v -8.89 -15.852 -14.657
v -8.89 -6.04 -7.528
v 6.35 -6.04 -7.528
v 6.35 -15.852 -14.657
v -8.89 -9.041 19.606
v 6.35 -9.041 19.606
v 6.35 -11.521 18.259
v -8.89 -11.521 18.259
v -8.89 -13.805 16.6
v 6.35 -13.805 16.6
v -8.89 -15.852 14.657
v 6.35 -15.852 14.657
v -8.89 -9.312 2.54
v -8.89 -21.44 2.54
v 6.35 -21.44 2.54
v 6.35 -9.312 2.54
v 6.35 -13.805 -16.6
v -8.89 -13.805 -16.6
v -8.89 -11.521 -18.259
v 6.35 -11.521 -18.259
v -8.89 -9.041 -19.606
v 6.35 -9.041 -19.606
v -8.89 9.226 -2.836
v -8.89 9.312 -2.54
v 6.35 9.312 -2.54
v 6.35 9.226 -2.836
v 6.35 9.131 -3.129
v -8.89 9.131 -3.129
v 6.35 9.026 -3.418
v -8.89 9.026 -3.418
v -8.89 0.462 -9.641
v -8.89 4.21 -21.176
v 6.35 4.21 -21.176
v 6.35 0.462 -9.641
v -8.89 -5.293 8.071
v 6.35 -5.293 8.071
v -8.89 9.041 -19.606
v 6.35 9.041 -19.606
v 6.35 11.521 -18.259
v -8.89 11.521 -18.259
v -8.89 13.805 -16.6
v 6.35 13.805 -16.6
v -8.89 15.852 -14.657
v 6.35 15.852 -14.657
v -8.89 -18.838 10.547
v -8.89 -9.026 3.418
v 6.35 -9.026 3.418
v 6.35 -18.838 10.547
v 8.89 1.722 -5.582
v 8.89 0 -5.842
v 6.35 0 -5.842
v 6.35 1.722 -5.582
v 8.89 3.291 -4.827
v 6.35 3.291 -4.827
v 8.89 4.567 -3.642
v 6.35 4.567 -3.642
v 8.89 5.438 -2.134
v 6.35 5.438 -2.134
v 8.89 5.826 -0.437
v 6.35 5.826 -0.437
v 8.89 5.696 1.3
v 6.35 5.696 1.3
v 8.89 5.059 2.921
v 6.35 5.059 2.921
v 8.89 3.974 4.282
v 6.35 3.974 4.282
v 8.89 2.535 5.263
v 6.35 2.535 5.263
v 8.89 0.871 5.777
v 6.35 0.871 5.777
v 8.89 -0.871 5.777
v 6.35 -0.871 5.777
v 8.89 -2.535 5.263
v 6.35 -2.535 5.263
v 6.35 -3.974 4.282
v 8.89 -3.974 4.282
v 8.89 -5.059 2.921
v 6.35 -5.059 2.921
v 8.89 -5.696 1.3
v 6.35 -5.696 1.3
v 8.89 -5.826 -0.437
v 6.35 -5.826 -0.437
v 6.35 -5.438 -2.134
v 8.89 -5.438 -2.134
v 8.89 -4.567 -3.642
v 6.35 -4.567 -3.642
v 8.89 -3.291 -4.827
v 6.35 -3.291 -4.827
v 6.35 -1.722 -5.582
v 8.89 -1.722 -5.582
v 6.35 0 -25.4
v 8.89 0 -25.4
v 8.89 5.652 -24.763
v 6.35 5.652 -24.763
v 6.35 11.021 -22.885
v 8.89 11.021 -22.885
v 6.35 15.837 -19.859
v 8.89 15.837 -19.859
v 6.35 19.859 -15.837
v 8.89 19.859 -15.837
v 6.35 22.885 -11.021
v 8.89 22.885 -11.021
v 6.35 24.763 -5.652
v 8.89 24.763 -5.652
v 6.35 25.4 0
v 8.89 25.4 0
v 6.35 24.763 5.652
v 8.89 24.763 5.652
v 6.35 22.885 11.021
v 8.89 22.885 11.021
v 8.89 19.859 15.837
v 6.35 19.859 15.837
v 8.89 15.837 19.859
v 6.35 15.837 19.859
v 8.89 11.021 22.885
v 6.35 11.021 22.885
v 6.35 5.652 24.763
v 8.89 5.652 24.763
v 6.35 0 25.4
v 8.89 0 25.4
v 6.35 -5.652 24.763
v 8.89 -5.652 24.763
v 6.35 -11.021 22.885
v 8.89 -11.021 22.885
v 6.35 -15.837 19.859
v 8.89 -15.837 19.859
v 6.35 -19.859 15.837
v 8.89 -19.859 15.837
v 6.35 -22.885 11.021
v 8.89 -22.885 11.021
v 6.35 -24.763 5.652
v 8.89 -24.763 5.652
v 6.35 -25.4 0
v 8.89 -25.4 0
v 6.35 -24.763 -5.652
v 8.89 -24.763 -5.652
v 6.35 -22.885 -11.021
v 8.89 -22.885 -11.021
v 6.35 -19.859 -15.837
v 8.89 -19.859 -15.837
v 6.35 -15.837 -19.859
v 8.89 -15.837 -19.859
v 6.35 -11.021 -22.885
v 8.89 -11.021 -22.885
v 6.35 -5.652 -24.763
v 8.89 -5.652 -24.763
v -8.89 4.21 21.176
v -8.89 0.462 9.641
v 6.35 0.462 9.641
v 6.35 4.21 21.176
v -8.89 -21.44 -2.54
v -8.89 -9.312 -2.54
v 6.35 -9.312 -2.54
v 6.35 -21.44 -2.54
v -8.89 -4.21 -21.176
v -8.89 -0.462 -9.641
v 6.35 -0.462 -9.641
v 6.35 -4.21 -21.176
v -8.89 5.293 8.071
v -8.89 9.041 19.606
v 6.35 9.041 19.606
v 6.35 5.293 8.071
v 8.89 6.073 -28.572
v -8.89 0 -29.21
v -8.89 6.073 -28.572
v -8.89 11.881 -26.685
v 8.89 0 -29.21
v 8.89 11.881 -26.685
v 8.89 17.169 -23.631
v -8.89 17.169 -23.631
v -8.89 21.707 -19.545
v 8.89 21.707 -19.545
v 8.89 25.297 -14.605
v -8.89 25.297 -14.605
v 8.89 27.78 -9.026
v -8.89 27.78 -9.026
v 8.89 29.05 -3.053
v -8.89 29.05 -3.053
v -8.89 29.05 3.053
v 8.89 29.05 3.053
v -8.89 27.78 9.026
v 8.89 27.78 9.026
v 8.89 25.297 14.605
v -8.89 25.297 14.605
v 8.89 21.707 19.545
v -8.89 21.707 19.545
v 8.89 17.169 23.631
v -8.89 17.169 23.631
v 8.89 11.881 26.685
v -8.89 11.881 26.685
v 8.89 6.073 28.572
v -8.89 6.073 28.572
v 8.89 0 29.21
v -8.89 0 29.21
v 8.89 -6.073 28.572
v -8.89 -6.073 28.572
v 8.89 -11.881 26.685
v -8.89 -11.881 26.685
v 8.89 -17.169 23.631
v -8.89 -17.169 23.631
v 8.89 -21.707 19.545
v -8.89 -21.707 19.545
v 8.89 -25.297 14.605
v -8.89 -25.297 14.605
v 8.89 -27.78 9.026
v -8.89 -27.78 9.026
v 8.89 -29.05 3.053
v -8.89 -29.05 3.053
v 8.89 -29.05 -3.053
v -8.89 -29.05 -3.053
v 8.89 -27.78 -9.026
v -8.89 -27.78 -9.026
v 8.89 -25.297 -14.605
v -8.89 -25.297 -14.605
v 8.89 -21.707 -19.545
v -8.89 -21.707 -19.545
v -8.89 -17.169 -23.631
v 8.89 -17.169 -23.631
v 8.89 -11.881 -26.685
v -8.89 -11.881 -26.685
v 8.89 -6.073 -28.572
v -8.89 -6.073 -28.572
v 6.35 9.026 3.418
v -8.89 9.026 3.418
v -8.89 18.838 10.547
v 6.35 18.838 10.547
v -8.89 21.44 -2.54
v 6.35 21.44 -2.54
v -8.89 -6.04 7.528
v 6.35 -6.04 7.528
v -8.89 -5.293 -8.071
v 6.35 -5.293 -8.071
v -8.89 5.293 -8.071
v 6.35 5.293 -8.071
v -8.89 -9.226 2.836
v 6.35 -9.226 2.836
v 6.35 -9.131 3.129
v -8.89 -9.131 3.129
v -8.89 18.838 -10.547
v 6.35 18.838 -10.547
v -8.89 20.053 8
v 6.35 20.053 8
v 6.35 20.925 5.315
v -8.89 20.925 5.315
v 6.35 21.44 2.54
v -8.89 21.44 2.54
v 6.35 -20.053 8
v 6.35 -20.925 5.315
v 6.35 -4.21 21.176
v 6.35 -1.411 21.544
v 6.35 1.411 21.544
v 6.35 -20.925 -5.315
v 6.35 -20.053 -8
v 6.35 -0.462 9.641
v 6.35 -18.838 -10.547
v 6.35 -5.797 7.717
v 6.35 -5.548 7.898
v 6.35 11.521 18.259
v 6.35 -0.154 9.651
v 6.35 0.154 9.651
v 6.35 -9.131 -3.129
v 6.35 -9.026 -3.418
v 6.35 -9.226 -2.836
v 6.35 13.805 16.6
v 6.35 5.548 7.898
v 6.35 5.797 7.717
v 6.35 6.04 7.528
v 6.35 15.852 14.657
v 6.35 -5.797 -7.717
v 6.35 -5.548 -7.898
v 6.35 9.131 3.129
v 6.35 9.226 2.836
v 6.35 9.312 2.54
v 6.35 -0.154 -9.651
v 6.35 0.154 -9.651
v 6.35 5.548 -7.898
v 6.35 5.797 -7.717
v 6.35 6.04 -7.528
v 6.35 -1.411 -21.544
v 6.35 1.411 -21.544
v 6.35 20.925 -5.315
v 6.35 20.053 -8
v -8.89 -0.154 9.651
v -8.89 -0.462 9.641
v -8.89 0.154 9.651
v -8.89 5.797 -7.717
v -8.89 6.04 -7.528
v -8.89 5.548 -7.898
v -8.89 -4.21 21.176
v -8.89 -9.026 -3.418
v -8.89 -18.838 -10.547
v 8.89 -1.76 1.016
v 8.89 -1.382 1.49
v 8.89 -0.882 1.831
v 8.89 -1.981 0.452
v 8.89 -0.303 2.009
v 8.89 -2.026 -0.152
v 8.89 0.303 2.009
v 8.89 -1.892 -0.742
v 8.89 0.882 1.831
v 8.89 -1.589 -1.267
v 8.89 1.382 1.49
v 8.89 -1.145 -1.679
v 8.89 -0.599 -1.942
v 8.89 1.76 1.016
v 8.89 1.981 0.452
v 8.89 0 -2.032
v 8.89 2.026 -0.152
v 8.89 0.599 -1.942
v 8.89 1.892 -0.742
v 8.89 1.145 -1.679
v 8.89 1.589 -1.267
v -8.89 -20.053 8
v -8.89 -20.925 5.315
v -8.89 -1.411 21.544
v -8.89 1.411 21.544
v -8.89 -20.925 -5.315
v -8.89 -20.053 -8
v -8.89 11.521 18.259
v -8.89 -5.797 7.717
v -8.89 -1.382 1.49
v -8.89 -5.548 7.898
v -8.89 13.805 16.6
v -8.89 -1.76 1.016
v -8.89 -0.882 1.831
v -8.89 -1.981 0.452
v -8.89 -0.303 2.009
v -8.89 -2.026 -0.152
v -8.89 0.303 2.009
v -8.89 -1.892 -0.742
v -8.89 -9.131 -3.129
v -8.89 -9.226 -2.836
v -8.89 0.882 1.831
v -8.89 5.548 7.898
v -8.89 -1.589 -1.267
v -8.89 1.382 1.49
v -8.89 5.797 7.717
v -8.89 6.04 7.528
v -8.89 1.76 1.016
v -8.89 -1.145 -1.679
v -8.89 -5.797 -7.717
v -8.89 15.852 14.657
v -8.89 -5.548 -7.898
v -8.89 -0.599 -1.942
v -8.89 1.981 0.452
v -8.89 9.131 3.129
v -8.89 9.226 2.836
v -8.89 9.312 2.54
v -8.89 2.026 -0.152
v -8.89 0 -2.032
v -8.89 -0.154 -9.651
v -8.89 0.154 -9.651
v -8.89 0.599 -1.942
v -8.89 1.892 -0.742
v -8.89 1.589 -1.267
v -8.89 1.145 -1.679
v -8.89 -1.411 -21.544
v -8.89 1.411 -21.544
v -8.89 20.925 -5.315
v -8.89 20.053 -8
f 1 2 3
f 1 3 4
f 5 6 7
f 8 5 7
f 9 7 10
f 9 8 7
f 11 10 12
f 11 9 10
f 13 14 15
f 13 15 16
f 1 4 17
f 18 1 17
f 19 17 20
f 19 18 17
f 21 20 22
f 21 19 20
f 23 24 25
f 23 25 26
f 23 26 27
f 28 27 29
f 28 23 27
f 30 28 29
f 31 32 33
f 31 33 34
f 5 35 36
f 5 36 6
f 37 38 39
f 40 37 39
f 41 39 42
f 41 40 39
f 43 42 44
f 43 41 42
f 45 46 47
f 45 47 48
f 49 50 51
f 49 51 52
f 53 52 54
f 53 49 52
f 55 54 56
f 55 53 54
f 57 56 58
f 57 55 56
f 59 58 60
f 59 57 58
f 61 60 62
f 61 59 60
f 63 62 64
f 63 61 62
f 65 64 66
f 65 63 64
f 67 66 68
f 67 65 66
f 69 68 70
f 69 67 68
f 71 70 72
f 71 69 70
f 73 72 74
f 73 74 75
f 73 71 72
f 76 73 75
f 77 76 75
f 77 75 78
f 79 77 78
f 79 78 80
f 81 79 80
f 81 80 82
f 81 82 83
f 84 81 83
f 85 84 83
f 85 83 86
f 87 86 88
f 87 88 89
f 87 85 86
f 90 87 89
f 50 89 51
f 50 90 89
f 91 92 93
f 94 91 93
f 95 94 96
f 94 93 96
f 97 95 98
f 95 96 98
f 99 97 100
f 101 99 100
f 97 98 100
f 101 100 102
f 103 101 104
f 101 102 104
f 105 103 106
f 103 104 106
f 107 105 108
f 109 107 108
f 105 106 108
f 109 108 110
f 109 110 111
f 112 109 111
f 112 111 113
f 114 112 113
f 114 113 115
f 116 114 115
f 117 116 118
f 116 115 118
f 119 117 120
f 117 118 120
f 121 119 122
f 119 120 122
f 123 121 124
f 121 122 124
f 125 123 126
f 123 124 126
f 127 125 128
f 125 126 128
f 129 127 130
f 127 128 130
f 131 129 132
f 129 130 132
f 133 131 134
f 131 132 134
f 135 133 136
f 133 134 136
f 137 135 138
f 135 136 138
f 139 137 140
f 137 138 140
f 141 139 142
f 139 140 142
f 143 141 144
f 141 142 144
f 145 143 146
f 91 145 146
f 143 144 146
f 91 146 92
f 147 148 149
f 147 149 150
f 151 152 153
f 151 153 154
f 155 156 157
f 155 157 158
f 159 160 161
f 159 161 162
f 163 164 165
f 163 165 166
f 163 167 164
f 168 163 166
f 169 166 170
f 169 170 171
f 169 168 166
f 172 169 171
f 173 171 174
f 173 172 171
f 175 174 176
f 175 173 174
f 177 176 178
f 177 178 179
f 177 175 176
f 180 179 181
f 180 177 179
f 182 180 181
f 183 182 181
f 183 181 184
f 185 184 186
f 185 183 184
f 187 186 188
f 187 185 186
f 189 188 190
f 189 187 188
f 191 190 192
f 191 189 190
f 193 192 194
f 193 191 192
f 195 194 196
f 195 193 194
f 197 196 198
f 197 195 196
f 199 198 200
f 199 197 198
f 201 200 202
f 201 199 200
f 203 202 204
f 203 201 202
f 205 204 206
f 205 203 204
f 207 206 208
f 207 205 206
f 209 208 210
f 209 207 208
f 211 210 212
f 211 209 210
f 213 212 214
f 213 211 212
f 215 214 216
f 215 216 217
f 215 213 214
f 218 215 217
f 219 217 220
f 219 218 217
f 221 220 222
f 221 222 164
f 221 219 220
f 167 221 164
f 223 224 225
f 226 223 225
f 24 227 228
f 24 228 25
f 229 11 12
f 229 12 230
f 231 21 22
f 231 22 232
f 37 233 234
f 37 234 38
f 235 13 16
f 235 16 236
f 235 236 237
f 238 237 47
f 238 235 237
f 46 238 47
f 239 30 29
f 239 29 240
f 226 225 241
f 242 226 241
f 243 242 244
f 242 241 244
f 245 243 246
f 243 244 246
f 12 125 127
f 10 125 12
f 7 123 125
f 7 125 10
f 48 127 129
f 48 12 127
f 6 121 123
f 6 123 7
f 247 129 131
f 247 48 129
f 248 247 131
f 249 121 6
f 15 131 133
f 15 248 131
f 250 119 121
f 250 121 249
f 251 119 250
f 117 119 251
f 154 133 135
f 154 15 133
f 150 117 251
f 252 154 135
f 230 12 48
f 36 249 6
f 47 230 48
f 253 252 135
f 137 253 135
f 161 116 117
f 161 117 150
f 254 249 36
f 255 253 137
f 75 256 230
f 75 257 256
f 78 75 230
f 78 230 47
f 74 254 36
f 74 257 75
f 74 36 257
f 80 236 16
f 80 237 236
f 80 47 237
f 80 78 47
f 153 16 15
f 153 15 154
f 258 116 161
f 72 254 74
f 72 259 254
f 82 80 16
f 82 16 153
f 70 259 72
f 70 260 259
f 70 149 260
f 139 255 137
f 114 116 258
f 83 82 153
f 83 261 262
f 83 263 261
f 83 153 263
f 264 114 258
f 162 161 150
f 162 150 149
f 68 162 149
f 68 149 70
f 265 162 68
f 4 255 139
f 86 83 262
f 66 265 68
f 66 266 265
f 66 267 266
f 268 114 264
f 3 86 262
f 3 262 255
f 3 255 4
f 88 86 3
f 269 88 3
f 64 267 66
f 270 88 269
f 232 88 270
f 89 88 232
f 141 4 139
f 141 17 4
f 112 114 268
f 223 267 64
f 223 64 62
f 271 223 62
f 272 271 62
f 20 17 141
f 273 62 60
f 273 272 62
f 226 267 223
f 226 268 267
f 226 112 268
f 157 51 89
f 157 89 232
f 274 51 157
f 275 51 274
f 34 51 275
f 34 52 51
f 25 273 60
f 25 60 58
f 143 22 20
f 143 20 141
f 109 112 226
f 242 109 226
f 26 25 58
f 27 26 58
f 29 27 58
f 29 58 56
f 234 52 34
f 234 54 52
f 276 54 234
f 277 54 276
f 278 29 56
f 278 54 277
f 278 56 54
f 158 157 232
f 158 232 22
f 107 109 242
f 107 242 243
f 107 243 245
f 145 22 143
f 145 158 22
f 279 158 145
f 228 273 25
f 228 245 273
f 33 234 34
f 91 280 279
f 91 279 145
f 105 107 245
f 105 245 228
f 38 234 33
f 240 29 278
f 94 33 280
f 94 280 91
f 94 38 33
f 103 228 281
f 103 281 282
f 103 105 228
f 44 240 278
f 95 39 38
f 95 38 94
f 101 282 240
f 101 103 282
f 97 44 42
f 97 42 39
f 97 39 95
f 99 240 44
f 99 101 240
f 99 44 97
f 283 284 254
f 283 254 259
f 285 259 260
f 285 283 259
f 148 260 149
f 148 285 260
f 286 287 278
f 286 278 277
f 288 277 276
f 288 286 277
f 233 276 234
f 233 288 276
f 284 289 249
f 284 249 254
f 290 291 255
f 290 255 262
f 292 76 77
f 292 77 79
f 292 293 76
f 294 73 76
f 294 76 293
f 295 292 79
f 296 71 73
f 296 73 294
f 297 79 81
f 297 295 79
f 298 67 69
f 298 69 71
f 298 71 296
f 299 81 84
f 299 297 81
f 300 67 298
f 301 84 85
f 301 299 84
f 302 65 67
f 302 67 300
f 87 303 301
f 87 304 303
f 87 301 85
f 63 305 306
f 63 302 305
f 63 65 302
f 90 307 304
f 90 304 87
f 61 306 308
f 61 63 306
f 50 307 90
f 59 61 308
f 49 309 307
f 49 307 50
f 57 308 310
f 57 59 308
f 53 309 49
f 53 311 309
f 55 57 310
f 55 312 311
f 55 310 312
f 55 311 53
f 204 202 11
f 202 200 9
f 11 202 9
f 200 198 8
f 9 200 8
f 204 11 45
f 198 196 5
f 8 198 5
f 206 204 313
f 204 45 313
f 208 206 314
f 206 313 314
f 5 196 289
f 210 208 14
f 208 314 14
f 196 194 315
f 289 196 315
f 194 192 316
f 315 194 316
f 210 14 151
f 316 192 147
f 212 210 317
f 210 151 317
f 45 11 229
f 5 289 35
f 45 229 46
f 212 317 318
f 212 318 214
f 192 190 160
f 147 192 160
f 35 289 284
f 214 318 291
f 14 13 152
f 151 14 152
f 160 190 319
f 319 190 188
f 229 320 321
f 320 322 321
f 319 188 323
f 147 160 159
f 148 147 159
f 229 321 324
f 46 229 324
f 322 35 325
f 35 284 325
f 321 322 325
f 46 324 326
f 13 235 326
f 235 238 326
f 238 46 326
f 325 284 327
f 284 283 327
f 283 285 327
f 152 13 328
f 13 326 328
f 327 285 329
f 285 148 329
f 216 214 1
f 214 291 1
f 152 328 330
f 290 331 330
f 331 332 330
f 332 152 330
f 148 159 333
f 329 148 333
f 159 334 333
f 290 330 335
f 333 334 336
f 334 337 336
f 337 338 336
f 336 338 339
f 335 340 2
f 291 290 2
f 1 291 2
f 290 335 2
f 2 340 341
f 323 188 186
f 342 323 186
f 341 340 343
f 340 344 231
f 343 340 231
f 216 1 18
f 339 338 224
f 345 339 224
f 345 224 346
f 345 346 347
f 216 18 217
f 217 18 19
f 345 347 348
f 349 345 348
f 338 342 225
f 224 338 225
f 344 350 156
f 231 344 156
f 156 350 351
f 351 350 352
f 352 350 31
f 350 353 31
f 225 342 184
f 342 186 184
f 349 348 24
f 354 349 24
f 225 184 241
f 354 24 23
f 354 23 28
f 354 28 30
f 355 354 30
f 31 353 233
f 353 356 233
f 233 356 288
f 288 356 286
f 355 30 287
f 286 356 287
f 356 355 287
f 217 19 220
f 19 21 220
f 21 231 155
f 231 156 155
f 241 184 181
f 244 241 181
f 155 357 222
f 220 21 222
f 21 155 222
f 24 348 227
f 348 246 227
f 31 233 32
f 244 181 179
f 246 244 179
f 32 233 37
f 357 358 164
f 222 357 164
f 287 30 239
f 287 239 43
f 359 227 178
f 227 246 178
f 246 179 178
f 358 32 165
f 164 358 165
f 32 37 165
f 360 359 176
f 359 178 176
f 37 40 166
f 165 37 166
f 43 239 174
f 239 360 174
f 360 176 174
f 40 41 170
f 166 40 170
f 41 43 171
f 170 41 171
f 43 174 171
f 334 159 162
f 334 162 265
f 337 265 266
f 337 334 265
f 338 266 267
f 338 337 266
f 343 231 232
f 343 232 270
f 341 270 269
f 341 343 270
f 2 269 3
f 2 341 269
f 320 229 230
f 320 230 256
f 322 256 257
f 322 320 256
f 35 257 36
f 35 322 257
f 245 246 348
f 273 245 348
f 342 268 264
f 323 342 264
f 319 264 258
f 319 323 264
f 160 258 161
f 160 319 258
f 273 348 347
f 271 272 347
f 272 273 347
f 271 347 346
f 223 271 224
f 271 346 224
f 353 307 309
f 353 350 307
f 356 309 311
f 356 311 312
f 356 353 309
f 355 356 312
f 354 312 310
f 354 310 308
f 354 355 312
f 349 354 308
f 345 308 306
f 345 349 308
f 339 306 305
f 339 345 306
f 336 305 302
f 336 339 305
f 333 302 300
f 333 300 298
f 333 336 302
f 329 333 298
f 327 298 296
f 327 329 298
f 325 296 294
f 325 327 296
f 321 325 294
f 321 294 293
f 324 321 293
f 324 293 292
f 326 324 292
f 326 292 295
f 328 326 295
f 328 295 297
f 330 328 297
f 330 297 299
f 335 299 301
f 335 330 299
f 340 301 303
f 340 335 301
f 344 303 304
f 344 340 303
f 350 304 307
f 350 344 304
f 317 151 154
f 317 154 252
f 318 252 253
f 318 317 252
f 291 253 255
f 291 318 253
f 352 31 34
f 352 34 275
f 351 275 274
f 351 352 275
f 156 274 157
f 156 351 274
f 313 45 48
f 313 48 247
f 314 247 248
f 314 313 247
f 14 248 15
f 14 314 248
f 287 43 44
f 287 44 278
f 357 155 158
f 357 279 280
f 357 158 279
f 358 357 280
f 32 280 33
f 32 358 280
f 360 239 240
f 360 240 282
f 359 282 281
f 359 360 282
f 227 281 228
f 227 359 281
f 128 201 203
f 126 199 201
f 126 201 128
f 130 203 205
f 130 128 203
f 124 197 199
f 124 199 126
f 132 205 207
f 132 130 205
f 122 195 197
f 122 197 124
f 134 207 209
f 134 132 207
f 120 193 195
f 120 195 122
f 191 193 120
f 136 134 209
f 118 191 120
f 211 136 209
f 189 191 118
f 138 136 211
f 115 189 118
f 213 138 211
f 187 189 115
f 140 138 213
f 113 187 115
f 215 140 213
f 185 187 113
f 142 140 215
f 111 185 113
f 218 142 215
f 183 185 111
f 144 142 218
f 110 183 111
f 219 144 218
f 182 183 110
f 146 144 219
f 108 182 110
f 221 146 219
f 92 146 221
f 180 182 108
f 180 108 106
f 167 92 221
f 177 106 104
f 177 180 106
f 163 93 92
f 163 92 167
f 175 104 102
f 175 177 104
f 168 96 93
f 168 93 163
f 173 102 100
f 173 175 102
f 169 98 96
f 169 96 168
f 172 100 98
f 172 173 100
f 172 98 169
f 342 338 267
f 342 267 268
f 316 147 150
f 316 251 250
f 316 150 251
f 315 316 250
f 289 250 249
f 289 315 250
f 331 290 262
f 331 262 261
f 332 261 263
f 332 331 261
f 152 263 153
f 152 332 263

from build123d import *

# Parameters (mm, degrees)
SKETCH1_R               = 29.21
SKETCH1_R_2             = 2.032
BOSS_EXTRUDE1_DEPTH     = 8.89
CUT_EXTRUDE1_DEPTH      = 45.973065272
CUT_EXTRUDE1_DEPTH_BACK = 45.973065272
SKETCH3_R               = 25.4
SKETCH3_R_2             = 5.842
CUT_EXTRUDE2_DEPTH      = 2.54


with BuildPart() as part:
    # Sketch1 → Boss-Extrude1 (new, symmetric)
    with BuildSketch(Plane(origin=(0, 0, 0), x_dir=(0, 0, -1), z_dir=(1, 0, 0))):
        Circle(SKETCH1_R)
        Circle(SKETCH1_R_2, mode=Mode.SUBTRACT)
    extrude(amount=BOSS_EXTRUDE1_DEPTH, both=True)

    # Sketch2 → Cut-Extrude1 (cut, two sides: drawn at the far end of the back side and taken through both)
    with BuildSketch(Plane(origin=(8.89, 0, 0), x_dir=(0, 0, -1), z_dir=(1, 0, 0)).offset(-CUT_EXTRUDE1_DEPTH_BACK)):
        with BuildLine():
            Line((-2.54, 21.44006763), (-2.54, 9.311793812))
            ThreePointArc((-2.54, 9.311793812), (-2.98263203, 9.179597495), (-3.418431909, 9.026373983))
            Line((-3.418431909, 9.026373983), (-10.547252396, 18.838353614))
            ThreePointArc((-10.547252396, 18.838353614), (-6.671676909, 20.533310187), (-2.54, 21.44006763))
        make_face()
        with BuildLine():
            Line((2.54, 21.44006763), (2.54, 9.311793812))
            ThreePointArc((2.54, 9.311793812), (2.98263203, 9.179597495), (3.418431909, 9.026373983))
            Line((3.418431909, 9.026373983), (10.547252396, 18.838353614))
            ThreePointArc((10.547252396, 18.838353614), (6.671676909, 20.533310187), (2.54, 21.44006763))
        make_face()
        with BuildLine():
            Line((14.657058727, 15.852404533), (7.528238241, 6.040424901))
            ThreePointArc((7.528238241, 6.040424901), (7.80863203, 5.673303255), (8.071139018, 5.293186087))
            Line((8.071139018, 5.293186087), (19.605812864, 9.04102881))
            ThreePointArc((19.605812864, 9.04102881), (17.466676909, 12.690283597), (14.657058727, 15.852404533))
        make_face()
        with BuildLine():
            Line((21.175619195, 4.209661707), (9.640945349, 0.461818985))
            ThreePointArc((9.640945349, 0.461818985), (9.652, 0), (9.640945349, -0.461818985))
            Line((9.640945349, -0.461818985), (21.175619195, -4.209661707))
            ThreePointArc((21.175619195, -4.209661707), (21.59, 0), (21.175619195, 4.209661707))
        make_face()
        with BuildLine():
            Line((19.605812864, -9.04102881), (8.071139018, -5.293186087))
            ThreePointArc((8.071139018, -5.293186087), (7.80863203, -5.673303255), (7.528238241, -6.040424901))
            Line((7.528238241, -6.040424901), (14.657058727, -15.852404533))
            ThreePointArc((14.657058727, -15.852404533), (17.466676909, -12.690283597), (19.605812864, -9.04102881))
        make_face()
        with BuildLine():
            Line((10.547252396, -18.838353614), (3.418431909, -9.026373983))
            ThreePointArc((3.418431909, -9.026373983), (2.98263203, -9.179597495), (2.54, -9.311793812))
            Line((2.54, -9.311793812), (2.54, -21.44006763))
            ThreePointArc((2.54, -21.44006763), (6.671676909, -20.533310187), (10.547252396, -18.838353614))
        make_face()
        with BuildLine():
            Line((-2.54, -21.44006763), (-2.54, -9.311793812))
            ThreePointArc((-2.54, -9.311793812), (-2.98263203, -9.179597495), (-3.418431909, -9.026373983))
            Line((-3.418431909, -9.026373983), (-10.547252396, -18.838353614))
            ThreePointArc((-10.547252396, -18.838353614), (-6.671676909, -20.533310187), (-2.54, -21.44006763))
        make_face()
        with BuildLine():
            Line((-14.657058727, -15.852404533), (-7.528238241, -6.040424901))
            ThreePointArc((-7.528238241, -6.040424901), (-7.80863203, -5.673303255), (-8.071139018, -5.293186087))
            Line((-8.071139018, -5.293186087), (-19.605812864, -9.04102881))
            ThreePointArc((-19.605812864, -9.04102881), (-17.466676909, -12.690283597), (-14.657058727, -15.852404533))
        make_face()
        with BuildLine():
            Line((-21.175619195, -4.209661707), (-9.640945349, -0.461818985))
            ThreePointArc((-9.640945349, -0.461818985), (-9.652, 0), (-9.640945349, 0.461818985))
            Line((-9.640945349, 0.461818985), (-21.175619195, 4.209661707))
            ThreePointArc((-21.175619195, 4.209661707), (-21.59, 0), (-21.175619195, -4.209661707))
        make_face()
        with BuildLine():
            Line((-19.605812864, 9.04102881), (-8.071139018, 5.293186087))
            ThreePointArc((-8.071139018, 5.293186087), (-7.80863203, 5.673303255), (-7.528238241, 6.040424901))
            Line((-7.528238241, 6.040424901), (-14.657058727, 15.852404533))
            ThreePointArc((-14.657058727, 15.852404533), (-17.466676909, 12.690283597), (-19.605812864, 9.04102881))
        make_face()
    extrude(amount=CUT_EXTRUDE1_DEPTH + CUT_EXTRUDE1_DEPTH_BACK, mode=Mode.SUBTRACT)

    # Sketch3 → Cut-Extrude2 (cut)
    with BuildSketch(Plane(origin=(8.89, 0, 0), x_dir=(0, 0, -1), z_dir=(1, 0, 0))):
        Circle(SKETCH3_R)
        Circle(SKETCH3_R_2, mode=Mode.SUBTRACT)
    extrude(amount=-CUT_EXTRUDE2_DEPTH, mode=Mode.SUBTRACT)


solid = part.part
